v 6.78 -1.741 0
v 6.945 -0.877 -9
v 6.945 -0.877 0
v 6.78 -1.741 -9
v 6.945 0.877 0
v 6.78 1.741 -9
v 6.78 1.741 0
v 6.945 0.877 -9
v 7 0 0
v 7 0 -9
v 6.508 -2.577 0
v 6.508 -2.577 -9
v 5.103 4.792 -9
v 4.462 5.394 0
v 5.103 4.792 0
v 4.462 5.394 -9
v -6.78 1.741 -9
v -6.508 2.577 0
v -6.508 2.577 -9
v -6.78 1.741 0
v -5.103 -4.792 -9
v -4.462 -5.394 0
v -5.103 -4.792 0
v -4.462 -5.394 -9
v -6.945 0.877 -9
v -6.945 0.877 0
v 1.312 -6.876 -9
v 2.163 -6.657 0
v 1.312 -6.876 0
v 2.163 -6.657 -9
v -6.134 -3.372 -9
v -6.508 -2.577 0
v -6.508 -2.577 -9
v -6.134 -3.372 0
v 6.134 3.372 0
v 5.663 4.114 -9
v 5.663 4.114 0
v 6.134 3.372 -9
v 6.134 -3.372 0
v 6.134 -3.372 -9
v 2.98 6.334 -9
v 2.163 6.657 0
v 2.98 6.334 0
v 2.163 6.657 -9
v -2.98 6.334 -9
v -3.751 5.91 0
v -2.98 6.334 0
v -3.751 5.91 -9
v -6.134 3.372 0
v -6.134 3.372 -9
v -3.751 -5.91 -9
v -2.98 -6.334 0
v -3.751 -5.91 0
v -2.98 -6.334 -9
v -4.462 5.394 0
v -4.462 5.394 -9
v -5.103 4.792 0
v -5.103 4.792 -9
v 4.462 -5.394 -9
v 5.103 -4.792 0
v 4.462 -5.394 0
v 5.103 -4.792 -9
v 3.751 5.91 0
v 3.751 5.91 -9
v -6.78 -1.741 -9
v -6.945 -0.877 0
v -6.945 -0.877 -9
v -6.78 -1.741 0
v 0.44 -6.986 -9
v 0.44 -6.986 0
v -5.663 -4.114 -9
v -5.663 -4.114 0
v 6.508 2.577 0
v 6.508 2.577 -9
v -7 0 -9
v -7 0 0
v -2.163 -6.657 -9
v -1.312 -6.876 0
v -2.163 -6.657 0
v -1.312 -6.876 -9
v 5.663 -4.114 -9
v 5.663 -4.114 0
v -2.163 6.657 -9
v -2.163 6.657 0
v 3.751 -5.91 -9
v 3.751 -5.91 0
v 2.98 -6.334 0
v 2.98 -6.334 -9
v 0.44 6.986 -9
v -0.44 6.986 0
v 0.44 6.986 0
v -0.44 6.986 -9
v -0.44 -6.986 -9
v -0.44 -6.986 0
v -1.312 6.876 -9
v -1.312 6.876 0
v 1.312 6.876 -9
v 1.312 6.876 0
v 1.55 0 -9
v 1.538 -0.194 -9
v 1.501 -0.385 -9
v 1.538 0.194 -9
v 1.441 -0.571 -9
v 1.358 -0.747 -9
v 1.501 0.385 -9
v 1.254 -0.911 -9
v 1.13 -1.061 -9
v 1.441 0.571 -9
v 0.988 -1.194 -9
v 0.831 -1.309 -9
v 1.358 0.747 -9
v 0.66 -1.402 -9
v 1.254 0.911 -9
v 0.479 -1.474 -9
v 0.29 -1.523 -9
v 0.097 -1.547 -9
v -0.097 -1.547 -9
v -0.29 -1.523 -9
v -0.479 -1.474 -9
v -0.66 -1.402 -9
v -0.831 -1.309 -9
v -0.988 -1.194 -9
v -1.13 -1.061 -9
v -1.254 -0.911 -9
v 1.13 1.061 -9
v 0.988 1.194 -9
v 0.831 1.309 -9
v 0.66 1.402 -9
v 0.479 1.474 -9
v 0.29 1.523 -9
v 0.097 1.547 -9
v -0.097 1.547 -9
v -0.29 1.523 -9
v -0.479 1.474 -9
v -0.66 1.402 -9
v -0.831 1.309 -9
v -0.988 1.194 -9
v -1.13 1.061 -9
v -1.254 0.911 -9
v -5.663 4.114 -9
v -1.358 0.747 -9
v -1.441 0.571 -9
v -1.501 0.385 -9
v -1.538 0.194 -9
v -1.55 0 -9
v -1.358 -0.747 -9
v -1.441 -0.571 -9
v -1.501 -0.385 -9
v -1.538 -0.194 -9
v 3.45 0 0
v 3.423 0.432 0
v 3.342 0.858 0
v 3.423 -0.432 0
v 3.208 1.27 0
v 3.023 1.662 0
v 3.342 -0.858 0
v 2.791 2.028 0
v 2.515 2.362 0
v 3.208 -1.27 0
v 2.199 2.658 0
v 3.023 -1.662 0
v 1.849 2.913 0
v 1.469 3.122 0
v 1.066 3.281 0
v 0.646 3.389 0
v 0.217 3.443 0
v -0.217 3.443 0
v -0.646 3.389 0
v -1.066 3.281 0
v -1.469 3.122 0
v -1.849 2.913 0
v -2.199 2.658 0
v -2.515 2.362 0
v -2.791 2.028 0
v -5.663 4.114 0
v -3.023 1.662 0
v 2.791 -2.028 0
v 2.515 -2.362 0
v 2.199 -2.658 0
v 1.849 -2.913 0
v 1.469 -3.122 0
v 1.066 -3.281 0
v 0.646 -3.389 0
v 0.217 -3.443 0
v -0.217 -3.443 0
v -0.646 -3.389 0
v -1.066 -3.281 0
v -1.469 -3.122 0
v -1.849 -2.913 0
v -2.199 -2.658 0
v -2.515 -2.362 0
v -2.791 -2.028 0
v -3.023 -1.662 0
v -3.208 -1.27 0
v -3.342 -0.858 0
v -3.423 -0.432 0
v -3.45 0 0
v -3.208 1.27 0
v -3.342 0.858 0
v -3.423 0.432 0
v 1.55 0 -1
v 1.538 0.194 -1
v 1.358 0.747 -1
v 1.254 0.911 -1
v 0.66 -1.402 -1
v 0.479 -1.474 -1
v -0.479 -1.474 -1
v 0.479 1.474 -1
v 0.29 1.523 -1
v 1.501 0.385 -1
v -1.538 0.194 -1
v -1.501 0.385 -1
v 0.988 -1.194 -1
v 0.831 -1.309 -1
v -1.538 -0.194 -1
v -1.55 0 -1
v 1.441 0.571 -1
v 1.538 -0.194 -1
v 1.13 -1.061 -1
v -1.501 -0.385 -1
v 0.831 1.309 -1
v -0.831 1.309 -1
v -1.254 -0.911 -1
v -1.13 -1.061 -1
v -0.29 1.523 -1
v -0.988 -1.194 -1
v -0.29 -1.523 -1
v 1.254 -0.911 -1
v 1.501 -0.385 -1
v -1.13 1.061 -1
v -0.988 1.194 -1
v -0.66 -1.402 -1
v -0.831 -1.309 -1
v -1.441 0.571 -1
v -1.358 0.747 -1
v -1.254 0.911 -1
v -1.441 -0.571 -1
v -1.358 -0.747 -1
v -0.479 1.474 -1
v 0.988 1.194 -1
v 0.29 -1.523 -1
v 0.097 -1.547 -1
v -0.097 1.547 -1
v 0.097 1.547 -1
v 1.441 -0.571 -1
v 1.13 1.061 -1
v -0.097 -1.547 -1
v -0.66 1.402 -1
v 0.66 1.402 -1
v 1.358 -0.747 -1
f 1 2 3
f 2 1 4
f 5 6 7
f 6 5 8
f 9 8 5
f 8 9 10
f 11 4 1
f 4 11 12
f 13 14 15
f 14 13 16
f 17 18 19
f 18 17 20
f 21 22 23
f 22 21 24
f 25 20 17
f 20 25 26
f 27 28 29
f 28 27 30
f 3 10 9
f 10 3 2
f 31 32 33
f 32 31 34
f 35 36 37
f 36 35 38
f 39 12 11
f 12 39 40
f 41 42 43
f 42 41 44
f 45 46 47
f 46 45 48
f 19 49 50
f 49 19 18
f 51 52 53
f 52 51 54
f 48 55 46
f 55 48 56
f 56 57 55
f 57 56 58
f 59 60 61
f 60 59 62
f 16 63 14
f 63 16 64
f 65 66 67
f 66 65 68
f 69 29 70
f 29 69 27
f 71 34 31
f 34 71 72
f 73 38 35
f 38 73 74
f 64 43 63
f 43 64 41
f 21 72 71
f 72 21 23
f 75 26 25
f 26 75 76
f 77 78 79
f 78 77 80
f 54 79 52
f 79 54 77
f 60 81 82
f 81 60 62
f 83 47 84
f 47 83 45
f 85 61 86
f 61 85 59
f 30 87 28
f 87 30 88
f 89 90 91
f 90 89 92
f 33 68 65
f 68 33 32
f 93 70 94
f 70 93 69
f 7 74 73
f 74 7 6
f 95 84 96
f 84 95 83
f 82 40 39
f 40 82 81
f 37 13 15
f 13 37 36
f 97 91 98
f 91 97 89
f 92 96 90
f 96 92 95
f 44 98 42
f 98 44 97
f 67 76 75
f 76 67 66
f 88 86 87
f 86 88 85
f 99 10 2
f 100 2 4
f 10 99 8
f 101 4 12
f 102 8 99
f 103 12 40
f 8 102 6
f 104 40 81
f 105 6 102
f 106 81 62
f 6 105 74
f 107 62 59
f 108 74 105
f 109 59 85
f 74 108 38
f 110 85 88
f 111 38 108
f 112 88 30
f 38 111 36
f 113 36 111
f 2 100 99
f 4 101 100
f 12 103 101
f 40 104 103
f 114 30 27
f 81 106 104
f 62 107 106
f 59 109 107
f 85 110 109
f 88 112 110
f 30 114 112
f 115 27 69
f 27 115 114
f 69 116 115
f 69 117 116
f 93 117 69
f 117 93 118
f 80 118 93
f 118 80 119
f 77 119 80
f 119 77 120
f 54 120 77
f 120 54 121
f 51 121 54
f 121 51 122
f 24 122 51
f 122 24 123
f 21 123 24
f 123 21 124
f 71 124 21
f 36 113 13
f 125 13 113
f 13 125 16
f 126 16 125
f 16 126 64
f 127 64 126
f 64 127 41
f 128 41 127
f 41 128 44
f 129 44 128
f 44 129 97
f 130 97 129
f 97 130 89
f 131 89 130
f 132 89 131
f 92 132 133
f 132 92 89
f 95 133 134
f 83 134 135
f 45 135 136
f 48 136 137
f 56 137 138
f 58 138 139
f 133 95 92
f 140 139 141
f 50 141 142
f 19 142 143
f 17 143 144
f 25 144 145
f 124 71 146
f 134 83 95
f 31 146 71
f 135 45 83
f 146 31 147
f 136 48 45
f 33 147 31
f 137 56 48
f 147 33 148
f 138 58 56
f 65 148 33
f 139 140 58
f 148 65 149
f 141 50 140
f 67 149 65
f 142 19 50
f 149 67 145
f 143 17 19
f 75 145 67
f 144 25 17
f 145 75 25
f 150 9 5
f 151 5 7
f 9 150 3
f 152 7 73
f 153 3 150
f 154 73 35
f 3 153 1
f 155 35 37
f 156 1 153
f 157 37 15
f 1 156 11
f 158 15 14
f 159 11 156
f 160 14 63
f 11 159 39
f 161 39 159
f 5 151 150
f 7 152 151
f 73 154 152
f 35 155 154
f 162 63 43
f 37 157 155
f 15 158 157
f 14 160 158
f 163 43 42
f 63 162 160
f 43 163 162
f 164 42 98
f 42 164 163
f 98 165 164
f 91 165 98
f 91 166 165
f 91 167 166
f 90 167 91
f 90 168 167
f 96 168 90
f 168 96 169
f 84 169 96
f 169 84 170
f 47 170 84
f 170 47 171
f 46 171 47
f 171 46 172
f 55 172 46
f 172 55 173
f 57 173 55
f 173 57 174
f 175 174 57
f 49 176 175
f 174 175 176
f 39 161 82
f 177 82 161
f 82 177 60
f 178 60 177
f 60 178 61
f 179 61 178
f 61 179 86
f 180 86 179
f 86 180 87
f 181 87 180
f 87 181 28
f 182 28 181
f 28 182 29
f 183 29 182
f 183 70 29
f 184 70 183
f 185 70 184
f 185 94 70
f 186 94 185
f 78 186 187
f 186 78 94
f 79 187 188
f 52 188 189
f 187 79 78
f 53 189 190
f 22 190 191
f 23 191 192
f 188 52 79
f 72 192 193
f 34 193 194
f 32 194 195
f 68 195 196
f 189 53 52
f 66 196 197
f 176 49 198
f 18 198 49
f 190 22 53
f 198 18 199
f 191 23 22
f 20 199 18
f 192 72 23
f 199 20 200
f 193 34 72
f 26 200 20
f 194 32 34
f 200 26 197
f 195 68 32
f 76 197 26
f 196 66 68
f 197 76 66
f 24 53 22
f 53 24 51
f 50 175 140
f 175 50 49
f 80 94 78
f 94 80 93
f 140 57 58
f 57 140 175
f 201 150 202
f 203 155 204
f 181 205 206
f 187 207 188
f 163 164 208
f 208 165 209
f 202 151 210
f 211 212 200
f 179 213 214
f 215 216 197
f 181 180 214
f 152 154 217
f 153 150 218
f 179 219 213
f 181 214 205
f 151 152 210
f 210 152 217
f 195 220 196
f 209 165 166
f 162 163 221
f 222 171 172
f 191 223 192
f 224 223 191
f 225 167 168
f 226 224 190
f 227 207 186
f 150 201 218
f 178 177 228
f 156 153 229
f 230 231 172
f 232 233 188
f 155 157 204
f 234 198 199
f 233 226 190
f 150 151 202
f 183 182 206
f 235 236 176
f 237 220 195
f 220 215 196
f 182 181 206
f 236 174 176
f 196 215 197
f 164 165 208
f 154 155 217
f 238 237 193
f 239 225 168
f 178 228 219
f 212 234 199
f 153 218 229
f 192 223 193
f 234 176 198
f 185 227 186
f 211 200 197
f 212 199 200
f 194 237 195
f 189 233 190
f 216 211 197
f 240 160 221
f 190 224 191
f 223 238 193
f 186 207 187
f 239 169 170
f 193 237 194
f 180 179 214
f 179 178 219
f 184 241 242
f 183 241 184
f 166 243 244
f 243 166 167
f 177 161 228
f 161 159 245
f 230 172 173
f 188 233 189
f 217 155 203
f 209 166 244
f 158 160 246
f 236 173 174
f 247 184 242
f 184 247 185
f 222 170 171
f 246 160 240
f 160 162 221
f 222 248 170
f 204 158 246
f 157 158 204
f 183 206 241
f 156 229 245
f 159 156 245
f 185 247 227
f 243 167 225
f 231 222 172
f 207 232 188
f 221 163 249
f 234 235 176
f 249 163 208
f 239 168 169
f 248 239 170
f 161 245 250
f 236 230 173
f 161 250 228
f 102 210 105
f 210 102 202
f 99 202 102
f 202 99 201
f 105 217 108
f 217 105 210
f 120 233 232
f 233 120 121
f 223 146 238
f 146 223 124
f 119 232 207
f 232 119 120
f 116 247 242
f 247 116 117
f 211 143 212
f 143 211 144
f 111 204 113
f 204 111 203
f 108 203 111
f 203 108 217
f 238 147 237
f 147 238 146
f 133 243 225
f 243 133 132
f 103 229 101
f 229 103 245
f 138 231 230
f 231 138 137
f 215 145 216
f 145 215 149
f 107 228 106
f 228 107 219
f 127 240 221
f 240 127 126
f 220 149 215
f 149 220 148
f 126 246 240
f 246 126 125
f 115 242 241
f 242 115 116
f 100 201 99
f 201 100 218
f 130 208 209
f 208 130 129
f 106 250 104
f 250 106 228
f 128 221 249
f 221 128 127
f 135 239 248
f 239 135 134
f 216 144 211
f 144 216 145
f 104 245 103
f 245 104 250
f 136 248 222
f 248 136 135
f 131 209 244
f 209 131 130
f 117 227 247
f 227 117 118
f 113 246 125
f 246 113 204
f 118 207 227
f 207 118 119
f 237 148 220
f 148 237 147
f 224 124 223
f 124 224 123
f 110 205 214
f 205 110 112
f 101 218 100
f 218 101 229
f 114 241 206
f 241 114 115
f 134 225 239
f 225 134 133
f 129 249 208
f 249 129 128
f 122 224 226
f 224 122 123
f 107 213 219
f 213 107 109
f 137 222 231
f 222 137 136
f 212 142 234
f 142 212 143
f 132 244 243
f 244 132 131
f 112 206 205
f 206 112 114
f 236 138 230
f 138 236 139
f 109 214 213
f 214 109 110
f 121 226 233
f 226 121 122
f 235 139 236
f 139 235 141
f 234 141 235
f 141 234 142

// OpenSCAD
$fn = 50;


difference() {
	union() {
		translate(v = [0, 0, -9.0000000000]) {
			cylinder(h = 9, r = 7.0000000000);
		}
		translate(v = [0, 0, -9.0000000000]) {
			cylinder(h = 9, r = 2.8750000000);
		}
	}
	union() {
		translate(v = [0, 0, 0]) {
			rotate(a = [0, 0, 0]) {
				difference() {
					union() {
						translate(v = [0, 0, -9.0000000000]) {
							cylinder(h = 9, r = 1.2500000000);
						}
						translate(v = [0, 0, -1.0000000000]) {
							cylinder(h = 1.0000000000, r1 = 1.5500000000, r2 = 3.4500000000);
						}
						translate(v = [0, 0, -9.0000000000]) {
							cylinder(h = 9, r = 1.5500000000);
						}
						translate(v = [0, 0, -9.0000000000]) {
							cylinder(h = 9, r = 1.2500000000);
						}
					}
					union();
				}
			}
		}
	}
}
